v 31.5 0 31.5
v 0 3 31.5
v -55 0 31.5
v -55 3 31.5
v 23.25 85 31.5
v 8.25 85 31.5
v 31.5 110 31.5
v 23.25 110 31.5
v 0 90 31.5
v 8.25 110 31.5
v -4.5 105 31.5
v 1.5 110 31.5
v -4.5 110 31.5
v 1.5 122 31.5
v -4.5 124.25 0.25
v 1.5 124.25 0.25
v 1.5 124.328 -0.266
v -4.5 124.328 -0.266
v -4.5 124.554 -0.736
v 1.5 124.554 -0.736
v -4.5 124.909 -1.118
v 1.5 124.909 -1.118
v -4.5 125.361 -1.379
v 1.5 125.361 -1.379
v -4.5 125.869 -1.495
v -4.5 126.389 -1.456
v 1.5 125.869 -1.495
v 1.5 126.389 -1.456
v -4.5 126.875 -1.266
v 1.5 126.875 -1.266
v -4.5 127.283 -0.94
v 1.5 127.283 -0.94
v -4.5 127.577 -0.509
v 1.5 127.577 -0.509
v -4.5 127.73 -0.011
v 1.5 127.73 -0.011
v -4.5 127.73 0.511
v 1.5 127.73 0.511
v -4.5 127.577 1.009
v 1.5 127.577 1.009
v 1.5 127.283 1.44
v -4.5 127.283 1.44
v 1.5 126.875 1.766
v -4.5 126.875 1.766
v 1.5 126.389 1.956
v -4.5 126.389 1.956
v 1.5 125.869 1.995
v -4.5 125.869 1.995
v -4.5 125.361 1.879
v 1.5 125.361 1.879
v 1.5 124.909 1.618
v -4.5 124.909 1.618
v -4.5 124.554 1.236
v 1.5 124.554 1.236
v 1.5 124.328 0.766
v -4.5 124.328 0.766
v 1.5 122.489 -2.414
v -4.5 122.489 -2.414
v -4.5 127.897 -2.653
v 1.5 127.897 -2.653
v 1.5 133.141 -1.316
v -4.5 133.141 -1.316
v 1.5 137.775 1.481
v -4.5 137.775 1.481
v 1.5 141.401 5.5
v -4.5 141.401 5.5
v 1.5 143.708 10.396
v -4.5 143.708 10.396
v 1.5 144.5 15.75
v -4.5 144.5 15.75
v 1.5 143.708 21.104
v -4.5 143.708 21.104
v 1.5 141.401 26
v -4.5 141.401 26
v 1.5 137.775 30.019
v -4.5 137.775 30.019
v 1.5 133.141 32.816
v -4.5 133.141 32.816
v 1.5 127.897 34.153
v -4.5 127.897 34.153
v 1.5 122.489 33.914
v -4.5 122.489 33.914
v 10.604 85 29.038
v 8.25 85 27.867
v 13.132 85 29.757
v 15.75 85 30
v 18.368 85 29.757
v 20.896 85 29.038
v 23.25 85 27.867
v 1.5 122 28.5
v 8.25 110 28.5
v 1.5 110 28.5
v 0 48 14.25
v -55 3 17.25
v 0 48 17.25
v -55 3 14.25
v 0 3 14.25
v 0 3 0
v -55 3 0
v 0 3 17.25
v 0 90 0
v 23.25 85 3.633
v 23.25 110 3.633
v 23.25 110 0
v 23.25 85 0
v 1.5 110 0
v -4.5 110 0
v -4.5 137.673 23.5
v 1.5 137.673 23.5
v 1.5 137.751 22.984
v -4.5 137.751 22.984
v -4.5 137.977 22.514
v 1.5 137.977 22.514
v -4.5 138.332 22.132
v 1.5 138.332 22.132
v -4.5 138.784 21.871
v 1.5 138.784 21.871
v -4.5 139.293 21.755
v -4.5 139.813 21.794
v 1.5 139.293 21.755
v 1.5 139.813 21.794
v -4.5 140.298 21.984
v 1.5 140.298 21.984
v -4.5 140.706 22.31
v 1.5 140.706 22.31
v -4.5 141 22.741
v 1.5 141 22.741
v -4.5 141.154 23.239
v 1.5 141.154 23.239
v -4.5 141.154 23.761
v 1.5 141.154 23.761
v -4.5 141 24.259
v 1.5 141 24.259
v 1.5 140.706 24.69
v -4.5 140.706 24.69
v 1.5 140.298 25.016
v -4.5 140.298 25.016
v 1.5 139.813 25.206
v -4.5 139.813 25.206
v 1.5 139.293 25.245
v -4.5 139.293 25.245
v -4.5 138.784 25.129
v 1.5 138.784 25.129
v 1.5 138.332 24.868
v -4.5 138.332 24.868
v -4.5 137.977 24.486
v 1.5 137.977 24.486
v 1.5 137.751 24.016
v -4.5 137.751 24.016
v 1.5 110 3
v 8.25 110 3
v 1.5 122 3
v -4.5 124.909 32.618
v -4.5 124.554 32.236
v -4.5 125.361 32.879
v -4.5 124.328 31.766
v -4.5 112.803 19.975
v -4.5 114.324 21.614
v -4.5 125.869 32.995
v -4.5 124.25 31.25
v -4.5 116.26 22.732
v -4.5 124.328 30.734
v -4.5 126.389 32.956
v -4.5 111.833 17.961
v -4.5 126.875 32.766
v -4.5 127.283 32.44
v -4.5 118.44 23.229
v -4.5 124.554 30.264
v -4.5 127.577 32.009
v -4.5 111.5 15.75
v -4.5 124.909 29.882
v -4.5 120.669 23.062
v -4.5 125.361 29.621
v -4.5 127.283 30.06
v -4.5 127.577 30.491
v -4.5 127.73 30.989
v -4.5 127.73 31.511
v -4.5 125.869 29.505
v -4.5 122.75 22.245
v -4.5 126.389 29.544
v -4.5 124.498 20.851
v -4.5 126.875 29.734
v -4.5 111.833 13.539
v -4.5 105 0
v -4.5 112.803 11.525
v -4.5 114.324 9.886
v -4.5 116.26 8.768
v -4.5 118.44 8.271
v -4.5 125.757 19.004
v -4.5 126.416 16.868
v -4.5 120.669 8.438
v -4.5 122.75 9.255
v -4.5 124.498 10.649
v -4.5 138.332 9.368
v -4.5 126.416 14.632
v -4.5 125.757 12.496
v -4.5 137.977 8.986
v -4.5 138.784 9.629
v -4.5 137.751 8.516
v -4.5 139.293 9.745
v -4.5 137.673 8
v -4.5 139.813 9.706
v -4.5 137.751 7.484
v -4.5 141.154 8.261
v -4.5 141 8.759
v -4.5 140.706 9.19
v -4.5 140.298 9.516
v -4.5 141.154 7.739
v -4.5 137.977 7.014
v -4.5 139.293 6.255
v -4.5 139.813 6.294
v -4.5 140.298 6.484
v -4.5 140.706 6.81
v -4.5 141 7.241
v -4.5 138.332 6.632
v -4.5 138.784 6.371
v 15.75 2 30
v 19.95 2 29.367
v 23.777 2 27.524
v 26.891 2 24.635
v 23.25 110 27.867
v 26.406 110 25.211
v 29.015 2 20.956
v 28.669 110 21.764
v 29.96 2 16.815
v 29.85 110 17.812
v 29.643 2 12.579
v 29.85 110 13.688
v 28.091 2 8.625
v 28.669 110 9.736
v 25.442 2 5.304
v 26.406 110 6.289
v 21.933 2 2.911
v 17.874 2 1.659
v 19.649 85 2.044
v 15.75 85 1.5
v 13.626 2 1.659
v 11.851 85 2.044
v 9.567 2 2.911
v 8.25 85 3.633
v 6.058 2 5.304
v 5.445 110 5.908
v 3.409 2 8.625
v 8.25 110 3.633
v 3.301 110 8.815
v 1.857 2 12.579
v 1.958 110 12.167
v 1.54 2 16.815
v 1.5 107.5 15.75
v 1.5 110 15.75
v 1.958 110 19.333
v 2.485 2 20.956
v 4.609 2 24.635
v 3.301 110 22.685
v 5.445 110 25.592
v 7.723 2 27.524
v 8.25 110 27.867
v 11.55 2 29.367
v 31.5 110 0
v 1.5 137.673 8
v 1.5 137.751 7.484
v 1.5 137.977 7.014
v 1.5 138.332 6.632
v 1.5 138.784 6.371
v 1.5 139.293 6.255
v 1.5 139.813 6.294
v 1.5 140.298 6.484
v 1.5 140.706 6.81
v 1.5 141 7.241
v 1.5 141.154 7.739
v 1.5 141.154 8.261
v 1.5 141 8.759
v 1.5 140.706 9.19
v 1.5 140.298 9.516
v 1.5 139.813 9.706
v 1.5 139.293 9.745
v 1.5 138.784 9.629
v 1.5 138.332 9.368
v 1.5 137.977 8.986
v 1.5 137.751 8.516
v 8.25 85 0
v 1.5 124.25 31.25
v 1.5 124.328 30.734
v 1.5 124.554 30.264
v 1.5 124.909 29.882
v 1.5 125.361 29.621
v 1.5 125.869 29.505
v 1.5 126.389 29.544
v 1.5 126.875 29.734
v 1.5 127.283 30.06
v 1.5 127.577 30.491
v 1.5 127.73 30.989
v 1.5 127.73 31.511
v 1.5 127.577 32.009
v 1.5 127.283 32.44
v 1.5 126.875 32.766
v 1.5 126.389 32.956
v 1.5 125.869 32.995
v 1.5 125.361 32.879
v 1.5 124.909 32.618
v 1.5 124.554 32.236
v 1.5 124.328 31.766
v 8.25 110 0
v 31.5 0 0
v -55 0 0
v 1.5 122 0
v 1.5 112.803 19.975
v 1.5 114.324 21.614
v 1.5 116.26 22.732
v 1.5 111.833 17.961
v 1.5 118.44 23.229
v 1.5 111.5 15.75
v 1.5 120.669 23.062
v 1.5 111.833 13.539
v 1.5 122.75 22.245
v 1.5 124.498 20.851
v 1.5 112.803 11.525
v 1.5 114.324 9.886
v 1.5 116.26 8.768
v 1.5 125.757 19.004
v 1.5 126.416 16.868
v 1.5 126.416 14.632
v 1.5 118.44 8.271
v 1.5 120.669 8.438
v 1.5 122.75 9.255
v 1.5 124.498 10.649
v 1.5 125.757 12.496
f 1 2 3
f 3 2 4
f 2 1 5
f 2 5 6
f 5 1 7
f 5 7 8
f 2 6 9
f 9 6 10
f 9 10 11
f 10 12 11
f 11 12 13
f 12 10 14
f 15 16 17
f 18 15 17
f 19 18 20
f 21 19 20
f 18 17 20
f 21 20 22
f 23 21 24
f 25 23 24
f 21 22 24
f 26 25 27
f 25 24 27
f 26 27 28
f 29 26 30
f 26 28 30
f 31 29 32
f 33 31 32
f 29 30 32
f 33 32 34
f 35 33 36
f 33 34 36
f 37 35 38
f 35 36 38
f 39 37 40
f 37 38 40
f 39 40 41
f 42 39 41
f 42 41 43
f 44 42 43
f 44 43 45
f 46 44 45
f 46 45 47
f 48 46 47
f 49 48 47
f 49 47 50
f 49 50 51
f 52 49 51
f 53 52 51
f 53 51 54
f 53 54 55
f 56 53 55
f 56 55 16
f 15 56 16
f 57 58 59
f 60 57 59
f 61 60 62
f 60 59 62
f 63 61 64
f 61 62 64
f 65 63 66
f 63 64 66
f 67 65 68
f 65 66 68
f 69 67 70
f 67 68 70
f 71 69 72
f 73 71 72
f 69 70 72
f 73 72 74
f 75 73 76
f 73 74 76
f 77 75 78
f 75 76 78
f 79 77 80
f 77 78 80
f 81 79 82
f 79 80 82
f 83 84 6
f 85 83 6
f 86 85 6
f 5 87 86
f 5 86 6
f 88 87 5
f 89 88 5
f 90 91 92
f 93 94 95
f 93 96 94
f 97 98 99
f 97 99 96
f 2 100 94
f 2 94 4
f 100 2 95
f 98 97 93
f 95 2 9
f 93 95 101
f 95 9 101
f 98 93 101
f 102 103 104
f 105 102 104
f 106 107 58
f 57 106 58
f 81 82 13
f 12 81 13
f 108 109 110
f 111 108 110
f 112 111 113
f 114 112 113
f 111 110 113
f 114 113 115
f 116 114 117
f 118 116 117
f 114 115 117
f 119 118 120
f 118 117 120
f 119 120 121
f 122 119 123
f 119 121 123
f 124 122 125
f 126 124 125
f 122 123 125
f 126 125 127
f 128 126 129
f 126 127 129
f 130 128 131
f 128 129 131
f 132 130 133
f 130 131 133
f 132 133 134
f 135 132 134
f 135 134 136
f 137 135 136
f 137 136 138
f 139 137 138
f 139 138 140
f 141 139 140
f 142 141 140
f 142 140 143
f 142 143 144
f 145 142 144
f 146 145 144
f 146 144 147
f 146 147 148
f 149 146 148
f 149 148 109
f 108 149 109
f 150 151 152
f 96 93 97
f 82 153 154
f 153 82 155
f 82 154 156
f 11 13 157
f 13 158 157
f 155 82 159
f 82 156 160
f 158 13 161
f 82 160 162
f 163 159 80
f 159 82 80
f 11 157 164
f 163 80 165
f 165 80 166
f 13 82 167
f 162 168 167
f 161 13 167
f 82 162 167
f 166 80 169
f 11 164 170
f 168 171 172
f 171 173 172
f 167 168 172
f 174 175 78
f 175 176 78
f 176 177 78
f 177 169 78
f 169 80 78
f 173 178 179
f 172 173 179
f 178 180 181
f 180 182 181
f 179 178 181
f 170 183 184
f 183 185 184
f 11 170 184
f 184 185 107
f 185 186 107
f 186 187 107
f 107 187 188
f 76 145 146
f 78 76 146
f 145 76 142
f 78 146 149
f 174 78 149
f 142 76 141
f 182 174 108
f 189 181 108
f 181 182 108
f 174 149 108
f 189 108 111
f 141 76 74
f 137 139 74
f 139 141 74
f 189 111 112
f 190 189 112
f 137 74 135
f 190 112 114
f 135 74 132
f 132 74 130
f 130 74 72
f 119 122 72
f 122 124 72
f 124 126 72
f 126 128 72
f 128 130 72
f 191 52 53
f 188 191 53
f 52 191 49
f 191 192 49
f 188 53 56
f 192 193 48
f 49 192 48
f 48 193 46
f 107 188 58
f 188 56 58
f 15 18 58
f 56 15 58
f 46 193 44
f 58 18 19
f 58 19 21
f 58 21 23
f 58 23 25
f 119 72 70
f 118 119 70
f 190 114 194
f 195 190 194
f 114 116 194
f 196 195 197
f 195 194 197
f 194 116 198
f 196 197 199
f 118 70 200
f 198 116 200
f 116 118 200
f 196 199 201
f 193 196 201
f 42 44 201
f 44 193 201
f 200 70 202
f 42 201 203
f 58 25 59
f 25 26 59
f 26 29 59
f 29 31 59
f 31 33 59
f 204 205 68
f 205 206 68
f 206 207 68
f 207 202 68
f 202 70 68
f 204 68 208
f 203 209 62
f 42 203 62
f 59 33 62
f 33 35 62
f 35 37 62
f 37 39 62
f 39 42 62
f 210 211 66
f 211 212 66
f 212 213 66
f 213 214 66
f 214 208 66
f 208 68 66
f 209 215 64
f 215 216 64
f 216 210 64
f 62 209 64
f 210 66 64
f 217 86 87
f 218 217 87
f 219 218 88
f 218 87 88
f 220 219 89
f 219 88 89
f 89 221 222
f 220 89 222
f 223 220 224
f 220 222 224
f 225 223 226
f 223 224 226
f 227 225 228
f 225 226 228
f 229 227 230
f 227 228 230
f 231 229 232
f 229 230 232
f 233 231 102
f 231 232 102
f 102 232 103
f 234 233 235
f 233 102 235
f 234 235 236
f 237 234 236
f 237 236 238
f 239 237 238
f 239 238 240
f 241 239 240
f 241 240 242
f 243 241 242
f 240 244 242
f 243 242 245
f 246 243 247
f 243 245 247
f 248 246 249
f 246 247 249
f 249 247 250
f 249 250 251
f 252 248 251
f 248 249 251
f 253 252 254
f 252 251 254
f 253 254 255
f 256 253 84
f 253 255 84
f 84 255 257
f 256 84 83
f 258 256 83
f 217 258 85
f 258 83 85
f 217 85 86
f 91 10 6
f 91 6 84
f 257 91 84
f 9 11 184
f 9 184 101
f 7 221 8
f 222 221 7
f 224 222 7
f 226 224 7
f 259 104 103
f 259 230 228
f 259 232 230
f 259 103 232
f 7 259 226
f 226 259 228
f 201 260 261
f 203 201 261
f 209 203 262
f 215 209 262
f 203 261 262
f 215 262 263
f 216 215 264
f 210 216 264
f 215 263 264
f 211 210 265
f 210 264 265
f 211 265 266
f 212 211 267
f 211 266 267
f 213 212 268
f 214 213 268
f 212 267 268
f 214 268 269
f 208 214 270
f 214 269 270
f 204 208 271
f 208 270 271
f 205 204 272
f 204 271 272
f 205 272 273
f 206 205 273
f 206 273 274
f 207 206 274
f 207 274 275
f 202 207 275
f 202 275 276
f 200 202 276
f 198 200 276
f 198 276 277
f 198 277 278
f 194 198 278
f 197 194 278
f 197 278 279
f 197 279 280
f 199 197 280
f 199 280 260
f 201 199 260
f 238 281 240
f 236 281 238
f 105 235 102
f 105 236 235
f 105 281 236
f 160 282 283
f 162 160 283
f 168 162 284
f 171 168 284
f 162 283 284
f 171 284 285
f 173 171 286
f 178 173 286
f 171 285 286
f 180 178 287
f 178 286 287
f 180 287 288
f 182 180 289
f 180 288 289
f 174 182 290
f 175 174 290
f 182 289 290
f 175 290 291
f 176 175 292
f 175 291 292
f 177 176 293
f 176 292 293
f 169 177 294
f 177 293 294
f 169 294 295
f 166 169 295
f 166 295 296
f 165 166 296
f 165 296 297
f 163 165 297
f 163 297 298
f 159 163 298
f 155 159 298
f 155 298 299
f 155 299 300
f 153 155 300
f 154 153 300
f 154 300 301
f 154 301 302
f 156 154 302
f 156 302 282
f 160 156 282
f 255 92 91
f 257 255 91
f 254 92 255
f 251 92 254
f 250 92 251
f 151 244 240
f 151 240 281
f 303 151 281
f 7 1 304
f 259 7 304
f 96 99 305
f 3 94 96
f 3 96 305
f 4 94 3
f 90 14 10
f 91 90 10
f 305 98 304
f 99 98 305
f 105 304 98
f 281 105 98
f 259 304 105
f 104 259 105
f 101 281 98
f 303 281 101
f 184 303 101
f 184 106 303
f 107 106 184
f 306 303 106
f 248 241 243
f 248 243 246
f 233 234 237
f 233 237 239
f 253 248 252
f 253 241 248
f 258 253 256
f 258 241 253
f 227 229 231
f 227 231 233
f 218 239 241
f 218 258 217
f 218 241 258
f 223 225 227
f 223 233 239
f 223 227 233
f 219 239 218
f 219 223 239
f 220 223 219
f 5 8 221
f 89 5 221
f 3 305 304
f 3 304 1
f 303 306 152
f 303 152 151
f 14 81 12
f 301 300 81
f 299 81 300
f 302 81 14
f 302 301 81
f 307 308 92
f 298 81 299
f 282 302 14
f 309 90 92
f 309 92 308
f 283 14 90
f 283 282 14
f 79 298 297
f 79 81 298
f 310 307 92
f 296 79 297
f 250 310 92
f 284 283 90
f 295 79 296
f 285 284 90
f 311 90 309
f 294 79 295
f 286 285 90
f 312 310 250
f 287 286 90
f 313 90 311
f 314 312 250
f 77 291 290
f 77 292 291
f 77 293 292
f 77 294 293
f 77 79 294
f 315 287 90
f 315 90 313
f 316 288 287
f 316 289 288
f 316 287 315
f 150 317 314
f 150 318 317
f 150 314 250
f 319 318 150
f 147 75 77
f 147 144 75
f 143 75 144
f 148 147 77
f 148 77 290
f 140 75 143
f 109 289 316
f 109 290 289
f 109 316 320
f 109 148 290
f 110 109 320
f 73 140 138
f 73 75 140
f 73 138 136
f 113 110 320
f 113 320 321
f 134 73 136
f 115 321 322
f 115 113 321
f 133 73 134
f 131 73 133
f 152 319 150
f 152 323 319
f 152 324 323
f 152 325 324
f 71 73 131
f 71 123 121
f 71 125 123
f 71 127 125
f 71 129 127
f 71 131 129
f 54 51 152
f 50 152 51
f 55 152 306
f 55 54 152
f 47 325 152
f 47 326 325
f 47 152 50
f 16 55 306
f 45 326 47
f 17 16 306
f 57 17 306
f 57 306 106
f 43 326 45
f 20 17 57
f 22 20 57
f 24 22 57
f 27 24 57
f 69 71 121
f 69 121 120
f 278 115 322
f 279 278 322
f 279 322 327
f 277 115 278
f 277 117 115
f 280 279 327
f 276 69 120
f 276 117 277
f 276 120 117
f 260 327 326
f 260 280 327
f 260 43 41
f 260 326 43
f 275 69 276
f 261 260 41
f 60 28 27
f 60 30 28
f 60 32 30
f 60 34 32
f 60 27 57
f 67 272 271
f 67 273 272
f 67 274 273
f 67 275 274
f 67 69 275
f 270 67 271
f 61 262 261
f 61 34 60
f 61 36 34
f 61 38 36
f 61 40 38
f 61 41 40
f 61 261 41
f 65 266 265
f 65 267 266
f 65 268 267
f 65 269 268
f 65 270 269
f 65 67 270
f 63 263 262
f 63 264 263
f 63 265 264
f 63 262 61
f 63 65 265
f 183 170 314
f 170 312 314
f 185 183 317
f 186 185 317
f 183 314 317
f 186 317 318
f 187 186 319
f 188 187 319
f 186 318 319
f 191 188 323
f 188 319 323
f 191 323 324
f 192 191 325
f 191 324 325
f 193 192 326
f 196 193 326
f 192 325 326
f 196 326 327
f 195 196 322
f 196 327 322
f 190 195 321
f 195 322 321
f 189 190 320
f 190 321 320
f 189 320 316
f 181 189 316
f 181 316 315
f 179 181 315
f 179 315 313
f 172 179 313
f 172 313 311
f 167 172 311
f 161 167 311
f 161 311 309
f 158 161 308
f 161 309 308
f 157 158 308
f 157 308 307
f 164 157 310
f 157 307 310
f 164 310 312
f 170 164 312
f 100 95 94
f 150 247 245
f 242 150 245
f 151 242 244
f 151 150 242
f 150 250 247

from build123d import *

# Parameters (mm, degrees)
SKETCH1_W           = 31.5
SKETCH1_H           = 31.5
BOSS_EXTRUDE1_DEPTH = 110
SKETCH2_R           = 14.25
CUT_EXTRUDE1_DEPTH  = 108
BOSS_EXTRUDE2_DEPTH = 1.5
BOSS_EXTRUDE3_DEPTH = 1.5
BOSS_EXTRUDE4_DEPTH = 31.5
SKETCH10_W          = 31.5
SKETCH10_H          = 3
BOSS_EXTRUDE5_DEPTH = 55
SKETCH9_W           = 15
SKETCH9_H           = 31.5
CUT_EXTRUDE4_DEPTH  = 25
BOSS_EXTRUDE6_DEPTH = 1.5
BOSS_EXTRUDE7_DEPTH = 3
BOSS_EXTRUDE8_DEPTH = 3
BOSS_EXTRUDE9_START = 4.5
BOSS_EXTRUDE9_DEPTH = 4.5
SKETCH7_R           = 1.75
SKETCH7_R_2         = 7.5
CUT_EXTRUDE3_DEPTH  = 17.25


with BuildPart() as part:
    # Sketch1 → Boss-Extrude1 (new body)
    with BuildSketch(Plane(origin=(0, 0, 0), x_dir=(1, 0, 0), z_dir=(0, 1, 0))):
        with Locations((15.75, -15.75)):
            Rectangle(SKETCH1_W, SKETCH1_H)
    extrude(amount=BOSS_EXTRUDE1_DEPTH)

    # Sketch2 → Cut-Extrude1 (cut)
    with BuildSketch(Plane(origin=(0, 110, 0), x_dir=(1, 0, 0), z_dir=(0, 1, 0))):
        with Locations(Location((15.75, -15.75, 0), (0, 0, 270))):
            Circle(SKETCH2_R)
    extrude(amount=-CUT_EXTRUDE1_DEPTH, mode=Mode.SUBTRACT)

    # Sketch4 → Boss-Extrude2 (add)
    with BuildSketch(Plane.ZY):
        with BuildLine():
            Line((33.91386173, 122.48942639), (31.5, 110))
            Line((31.5, 110), (25.037087811, 110))
            ThreePointArc((25.037087811, 110), (15.75, 107.5), (6.462912189, 110))
            Line((6.462912189, 110), (0, 110))
            Line((0, 110), (-2.41386173, 122.48942639))
            ThreePointArc((-2.41386173, 122.48942639), (15.75, 144.5), (33.91386173, 122.48942639))
        make_face()
    extrude(amount=-BOSS_EXTRUDE2_DEPTH)

    # Sketch4<3> → Boss-Extrude3 (add)
    with BuildSketch(Plane.ZY):
        with BuildLine():
            Line((33.91386173, 122.48942639), (31.5, 110))
            Line((31.5, 110), (25.037087811, 110))
            ThreePointArc((25.037087811, 110), (15.75, 107.5), (6.462912189, 110))
            Line((6.462912189, 110), (0, 110))
            Line((0, 110), (-2.41386173, 122.48942639))
            ThreePointArc((-2.41386173, 122.48942639), (15.75, 144.5), (33.91386173, 122.48942639))
        make_face()
    extrude(amount=-BOSS_EXTRUDE3_DEPTH)

    # Sketch6 → Boss-Extrude4 (add)
    with BuildSketch(Plane.XY.offset(31.5)):
        Polygon((0, 90), (0, 110), (-4.5, 110), (-4.5, 105), align=None)
    extrude(amount=-BOSS_EXTRUDE4_DEPTH)

    # Sketch10 → Boss-Extrude5 (add)
    with BuildSketch(Plane.ZY):
        with Locations((15.75, 1.5)):
            Rectangle(SKETCH10_W, SKETCH10_H)
    extrude(amount=BOSS_EXTRUDE5_DEPTH)

    # Sketch9 → Cut-Extrude4 (cut)
    with BuildSketch(Plane(origin=(0, 110, 0), x_dir=(1, 0, 0), z_dir=(0, 1, 0))):
        with Locations((15.75, -15.75)):
            Rectangle(SKETCH9_W, SKETCH9_H)
    extrude(amount=-CUT_EXTRUDE4_DEPTH, mode=Mode.SUBTRACT)

    # Sketch14 → Boss-Extrude6 (add, symmetric)
    with BuildSketch(Plane(origin=(0, 0, 15.75), x_dir=(-1, 0, 0), z_dir=(0, 0, -1))):
        Polygon((55, 3), (0, 48), (0, 3), align=None)
    extrude(amount=BOSS_EXTRUDE6_DEPTH, both=True)

    # Sketch15 → Boss-Extrude7 (add)
    with BuildSketch(Plane.XY.offset(31.5)):
        Polygon((8.25, 110), (1.5, 110), (1.5, 122), align=None)
    extrude(amount=-BOSS_EXTRUDE7_DEPTH)

    # Sketch16 → Boss-Extrude8 (add)
    with BuildSketch(Plane(origin=(0, 0, 0), x_dir=(-1, 0, 0), z_dir=(0, 0, -1))):
        Polygon((-8.25, 110), (-1.5, 110), (-1.5, 122), align=None)
    extrude(amount=-BOSS_EXTRUDE8_DEPTH)

    # Sketch4<4> → Boss-Extrude9 (add)
    with BuildSketch(Plane.ZY.offset(BOSS_EXTRUDE9_START)):
        with BuildLine():
            Line((33.91386173, 122.48942639), (31.5, 110))
            Line((31.5, 110), (25.037087811, 110))
            ThreePointArc((25.037087811, 110), (15.75, 107.5), (6.462912189, 110))
            Line((6.462912189, 110), (0, 110))
            Line((0, 110), (-2.41386173, 122.48942639))
            ThreePointArc((-2.41386173, 122.48942639), (15.75, 144.5), (33.91386173, 122.48942639))
        make_face()
    extrude(amount=-BOSS_EXTRUDE9_DEPTH)

    # Sketch7 → Cut-Extrude3 (cut, symmetric)
    with BuildSketch(Plane(origin=(1.5, 0, 0), x_dir=(0, 0, -1), z_dir=(1, 0, 0))):
        with Locations(Location((-31.25, 126, 0), (0, 0, 270))):
            Circle(SKETCH7_R)
        with Locations(Location((-23.5, 139.423393759, 0), (0, 0, 270))):
            Circle(SKETCH7_R)
        with Locations(Location((-8, 139.423393759, 0), (0, 0, 270))):
            Circle(SKETCH7_R)
        with Locations(Location((-0.25, 126, 0), (0, 0, 270))):
            Circle(SKETCH7_R)
        with Locations(Location((-15.75, 119, 0), (0, 0, 270))):
            Circle(SKETCH7_R_2)
    extrude(amount=CUT_EXTRUDE3_DEPTH, both=True, mode=Mode.SUBTRACT)


solid = part.part
